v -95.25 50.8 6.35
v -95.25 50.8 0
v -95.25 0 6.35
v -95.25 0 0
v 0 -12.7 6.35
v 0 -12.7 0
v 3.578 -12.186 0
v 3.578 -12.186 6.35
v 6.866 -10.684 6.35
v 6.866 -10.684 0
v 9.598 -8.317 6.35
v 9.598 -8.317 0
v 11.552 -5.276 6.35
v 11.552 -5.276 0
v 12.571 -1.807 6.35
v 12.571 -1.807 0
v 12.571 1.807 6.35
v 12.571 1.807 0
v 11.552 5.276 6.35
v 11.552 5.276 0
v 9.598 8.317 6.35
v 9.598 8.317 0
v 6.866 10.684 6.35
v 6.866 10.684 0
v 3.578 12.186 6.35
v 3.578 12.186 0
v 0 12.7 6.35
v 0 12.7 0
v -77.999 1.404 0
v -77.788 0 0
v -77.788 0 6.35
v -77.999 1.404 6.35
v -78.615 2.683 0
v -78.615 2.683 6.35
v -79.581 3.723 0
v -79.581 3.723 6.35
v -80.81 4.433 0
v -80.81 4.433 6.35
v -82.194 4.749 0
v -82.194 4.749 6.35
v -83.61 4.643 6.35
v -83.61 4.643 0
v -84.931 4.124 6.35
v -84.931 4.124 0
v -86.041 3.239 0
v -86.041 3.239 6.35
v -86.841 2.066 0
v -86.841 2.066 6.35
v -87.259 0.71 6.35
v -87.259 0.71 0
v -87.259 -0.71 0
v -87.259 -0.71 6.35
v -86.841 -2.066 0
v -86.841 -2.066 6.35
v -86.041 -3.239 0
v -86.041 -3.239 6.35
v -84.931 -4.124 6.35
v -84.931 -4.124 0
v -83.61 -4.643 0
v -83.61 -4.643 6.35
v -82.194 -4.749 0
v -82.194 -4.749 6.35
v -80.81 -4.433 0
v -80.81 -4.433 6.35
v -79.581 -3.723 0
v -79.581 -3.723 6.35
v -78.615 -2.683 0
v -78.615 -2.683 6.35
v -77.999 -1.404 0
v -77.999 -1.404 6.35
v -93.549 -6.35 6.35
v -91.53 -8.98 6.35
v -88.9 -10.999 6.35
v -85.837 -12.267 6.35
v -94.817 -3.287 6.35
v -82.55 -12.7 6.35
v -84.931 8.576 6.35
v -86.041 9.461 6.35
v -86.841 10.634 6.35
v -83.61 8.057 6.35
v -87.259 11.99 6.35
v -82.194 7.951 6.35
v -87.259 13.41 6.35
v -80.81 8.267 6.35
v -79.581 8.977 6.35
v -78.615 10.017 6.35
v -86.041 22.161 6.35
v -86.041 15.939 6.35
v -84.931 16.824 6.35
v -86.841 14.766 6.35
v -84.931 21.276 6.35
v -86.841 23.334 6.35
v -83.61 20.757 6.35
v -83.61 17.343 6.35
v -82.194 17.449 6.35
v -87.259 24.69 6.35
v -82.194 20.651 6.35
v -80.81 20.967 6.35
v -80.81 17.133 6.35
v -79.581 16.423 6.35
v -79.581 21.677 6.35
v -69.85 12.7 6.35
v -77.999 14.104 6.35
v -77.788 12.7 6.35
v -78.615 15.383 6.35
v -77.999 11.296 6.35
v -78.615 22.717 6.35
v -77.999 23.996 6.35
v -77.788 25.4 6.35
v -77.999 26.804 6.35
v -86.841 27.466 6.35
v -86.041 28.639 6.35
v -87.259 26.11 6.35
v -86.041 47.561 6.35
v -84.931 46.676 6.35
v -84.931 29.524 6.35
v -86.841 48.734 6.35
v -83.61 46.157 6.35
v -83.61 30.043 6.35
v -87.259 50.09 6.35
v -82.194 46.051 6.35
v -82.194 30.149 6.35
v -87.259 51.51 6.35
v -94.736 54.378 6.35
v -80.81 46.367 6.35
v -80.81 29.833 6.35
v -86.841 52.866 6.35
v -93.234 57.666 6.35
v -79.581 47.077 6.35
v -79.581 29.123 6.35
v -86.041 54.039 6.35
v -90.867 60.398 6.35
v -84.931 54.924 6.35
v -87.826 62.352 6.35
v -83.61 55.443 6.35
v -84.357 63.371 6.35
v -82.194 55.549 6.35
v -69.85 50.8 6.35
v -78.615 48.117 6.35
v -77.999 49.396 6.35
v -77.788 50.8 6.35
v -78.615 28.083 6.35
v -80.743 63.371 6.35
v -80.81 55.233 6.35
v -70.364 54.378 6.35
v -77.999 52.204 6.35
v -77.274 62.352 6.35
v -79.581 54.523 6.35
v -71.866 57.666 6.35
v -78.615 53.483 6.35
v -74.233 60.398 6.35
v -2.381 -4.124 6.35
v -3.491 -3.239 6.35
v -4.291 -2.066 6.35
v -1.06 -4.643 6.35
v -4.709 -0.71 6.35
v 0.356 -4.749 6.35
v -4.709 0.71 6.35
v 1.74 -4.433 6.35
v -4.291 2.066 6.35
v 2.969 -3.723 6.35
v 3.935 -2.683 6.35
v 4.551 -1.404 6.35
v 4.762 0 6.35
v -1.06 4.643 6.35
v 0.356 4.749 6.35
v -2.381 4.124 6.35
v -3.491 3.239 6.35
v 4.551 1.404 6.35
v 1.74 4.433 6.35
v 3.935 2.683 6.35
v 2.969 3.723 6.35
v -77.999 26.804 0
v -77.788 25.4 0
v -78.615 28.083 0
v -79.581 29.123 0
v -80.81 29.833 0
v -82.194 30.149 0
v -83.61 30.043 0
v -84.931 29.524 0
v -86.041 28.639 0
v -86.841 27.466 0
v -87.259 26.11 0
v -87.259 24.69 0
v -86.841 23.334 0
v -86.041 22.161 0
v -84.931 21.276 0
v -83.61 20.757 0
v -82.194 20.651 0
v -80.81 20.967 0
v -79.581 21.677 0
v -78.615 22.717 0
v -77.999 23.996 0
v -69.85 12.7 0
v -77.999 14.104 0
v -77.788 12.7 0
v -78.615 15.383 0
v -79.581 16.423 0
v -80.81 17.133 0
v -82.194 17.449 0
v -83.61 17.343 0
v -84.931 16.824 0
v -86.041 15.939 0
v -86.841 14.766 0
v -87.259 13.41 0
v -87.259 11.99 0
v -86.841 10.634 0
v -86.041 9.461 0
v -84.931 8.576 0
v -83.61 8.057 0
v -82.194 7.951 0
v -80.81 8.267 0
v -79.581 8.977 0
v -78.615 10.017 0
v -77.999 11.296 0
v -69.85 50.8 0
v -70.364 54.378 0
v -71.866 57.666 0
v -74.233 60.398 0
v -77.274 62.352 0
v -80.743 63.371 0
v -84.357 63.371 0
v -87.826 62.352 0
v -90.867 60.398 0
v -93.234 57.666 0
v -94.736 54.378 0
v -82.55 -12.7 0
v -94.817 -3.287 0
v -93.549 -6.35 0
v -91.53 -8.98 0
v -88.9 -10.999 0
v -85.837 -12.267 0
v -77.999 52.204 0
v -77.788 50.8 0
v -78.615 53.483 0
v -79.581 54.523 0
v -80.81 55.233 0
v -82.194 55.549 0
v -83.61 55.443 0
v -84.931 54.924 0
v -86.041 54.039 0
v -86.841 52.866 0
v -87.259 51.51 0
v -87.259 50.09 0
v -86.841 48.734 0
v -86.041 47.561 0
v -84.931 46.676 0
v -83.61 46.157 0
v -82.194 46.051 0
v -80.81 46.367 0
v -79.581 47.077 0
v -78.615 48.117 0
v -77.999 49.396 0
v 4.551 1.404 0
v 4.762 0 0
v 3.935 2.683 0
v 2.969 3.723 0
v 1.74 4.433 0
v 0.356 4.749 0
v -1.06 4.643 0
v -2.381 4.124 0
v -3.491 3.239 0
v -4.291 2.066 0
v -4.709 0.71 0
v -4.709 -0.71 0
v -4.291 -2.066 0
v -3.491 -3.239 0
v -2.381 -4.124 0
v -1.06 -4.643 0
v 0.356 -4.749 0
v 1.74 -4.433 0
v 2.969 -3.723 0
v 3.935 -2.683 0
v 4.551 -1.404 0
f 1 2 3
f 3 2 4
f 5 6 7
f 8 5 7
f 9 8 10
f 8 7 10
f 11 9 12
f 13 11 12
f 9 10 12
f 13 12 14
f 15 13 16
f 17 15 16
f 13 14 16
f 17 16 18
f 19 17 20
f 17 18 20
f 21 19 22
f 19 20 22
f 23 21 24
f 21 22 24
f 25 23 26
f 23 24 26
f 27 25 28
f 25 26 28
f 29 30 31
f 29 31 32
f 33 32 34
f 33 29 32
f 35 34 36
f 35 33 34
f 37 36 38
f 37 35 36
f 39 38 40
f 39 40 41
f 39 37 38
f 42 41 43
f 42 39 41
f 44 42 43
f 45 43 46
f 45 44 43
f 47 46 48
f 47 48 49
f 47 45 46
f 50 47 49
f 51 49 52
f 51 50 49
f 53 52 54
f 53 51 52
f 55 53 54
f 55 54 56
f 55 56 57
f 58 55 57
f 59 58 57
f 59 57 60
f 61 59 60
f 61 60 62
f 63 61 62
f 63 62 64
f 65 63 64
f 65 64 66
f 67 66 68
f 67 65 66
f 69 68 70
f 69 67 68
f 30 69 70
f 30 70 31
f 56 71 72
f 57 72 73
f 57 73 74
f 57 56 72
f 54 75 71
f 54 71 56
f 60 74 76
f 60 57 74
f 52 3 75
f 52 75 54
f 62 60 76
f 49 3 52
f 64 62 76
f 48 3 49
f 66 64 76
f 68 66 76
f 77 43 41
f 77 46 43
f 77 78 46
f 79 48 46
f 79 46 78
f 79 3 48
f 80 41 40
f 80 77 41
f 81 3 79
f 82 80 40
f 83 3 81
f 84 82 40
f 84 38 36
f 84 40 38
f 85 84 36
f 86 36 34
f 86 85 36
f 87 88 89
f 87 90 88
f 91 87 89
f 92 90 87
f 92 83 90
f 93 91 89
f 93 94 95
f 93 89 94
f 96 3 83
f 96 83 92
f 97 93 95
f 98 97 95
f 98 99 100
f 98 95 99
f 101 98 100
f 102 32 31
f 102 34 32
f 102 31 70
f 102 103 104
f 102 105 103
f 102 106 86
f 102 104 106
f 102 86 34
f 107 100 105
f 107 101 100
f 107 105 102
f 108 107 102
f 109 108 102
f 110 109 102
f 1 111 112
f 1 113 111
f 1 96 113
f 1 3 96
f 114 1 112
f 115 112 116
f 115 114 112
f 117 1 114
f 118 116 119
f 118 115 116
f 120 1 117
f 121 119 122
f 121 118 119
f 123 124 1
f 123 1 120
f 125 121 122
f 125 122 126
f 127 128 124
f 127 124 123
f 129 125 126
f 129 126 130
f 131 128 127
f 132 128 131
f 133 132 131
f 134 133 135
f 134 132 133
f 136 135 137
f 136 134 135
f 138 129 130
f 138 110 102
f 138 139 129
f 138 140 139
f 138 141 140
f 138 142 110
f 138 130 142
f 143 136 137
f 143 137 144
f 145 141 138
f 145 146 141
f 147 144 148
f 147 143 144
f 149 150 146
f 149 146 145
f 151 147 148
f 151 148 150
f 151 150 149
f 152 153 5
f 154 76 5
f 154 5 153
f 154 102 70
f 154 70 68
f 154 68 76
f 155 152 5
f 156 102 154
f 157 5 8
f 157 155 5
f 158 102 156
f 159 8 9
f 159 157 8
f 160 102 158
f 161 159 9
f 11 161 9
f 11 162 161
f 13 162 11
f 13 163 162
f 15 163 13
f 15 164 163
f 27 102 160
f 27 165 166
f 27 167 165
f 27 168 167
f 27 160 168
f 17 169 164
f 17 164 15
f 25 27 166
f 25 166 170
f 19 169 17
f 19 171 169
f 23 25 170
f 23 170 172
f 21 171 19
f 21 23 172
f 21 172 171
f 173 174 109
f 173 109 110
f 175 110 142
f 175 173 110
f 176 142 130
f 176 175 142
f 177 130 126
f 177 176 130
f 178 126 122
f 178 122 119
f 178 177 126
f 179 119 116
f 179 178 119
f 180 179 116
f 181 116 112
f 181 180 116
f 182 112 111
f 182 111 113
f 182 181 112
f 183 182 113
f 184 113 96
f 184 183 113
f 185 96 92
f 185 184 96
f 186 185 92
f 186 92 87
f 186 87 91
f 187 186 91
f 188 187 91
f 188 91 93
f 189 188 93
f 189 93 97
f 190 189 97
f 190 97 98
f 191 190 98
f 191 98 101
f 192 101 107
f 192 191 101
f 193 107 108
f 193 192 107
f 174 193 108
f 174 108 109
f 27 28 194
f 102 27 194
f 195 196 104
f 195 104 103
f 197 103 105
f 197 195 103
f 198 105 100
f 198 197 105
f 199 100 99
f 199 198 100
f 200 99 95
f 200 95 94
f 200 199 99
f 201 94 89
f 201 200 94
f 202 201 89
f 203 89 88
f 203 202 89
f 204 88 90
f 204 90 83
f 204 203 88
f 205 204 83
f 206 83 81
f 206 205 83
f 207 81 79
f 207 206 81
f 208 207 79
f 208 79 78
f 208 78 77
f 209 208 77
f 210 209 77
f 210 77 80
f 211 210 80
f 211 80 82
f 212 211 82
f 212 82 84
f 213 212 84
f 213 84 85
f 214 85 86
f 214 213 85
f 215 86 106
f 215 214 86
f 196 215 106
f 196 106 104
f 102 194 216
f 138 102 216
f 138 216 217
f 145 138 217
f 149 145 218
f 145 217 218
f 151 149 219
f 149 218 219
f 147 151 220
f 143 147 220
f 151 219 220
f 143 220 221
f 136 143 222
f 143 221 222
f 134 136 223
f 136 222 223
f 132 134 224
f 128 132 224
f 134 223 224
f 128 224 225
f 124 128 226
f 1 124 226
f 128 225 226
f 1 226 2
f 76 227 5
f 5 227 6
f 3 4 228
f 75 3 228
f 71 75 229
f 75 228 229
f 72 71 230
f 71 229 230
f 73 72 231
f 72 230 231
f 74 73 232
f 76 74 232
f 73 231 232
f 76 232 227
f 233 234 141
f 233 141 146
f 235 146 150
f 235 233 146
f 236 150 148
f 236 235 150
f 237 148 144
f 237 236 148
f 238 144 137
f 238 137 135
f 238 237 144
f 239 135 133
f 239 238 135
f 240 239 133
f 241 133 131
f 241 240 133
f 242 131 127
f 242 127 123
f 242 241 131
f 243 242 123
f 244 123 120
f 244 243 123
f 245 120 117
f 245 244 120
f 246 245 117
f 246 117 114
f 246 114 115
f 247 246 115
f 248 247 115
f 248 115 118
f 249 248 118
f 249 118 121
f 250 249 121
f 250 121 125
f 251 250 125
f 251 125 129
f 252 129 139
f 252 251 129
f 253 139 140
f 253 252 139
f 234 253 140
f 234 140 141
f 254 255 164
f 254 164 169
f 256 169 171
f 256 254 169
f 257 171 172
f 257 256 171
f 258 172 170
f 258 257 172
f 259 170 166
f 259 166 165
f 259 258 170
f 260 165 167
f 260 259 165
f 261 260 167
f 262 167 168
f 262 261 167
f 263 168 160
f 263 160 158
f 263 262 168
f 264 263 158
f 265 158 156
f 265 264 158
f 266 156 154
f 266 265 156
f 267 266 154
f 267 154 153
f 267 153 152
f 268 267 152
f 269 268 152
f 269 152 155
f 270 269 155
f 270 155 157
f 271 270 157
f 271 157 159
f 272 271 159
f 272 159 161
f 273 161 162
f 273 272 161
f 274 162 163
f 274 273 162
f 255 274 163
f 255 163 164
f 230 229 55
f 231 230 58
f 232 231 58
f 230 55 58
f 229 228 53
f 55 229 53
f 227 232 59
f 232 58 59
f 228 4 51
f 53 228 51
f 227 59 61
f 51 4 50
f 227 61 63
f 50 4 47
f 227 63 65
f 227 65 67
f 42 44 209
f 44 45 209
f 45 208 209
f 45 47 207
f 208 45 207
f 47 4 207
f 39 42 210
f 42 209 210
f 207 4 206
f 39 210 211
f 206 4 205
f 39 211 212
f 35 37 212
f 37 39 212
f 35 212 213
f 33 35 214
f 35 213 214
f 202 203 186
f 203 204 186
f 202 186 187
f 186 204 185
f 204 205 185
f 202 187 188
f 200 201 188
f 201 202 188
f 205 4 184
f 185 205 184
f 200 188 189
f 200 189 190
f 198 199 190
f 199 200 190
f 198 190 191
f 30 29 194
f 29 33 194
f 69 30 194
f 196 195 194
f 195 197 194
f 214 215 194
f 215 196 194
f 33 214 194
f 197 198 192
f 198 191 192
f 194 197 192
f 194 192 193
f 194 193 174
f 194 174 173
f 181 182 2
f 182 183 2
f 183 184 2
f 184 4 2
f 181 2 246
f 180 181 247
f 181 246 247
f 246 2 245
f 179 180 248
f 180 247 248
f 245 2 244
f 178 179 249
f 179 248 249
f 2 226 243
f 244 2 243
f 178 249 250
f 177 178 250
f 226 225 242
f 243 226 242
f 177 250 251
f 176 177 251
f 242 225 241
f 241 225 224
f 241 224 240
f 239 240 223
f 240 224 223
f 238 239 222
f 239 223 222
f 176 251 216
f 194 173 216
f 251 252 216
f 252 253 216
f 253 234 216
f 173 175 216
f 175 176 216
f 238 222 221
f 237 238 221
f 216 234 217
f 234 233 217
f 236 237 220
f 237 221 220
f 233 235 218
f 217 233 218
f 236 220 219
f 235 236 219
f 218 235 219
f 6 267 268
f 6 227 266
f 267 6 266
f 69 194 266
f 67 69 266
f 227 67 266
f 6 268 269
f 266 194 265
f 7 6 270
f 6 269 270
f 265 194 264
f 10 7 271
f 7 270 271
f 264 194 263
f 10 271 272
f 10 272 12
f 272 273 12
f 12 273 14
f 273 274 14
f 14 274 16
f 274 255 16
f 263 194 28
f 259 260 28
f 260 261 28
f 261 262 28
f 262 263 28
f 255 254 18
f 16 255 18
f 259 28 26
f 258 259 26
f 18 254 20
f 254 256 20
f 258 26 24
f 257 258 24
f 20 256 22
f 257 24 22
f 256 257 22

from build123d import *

# Parameters (mm, degrees)
SKETCH1_R           = 4.7625
BOSS_EXTRUDE1_DEPTH = 6.35


with BuildPart() as part:
    # Sketch1 → Boss-Extrude1 (new body)
    with BuildSketch(Plane.XY):
        with BuildLine():
            Line((-82.55, -12.7), (0, -12.7))
            ThreePointArc((0, -12.7), (12.7, 0), (0, 12.7))
            Line((0, 12.7), (-69.85, 12.7))
            Line((-69.85, 12.7), (-69.85, 50.8))
            ThreePointArc((-69.85, 50.8), (-82.55, 63.5), (-95.25, 50.8))
            Line((-95.25, 50.8), (-95.25, 0))
            ThreePointArc((-95.25, 0), (-91.530256121, -8.980256121), (-82.55, -12.7))
        make_face()
        with Locations((-82.55, 12.7)):
            Circle(SKETCH1_R, mode=Mode.SUBTRACT)
        Circle(SKETCH1_R, mode=Mode.SUBTRACT)
        with Locations((-82.55, 0)):
            Circle(SKETCH1_R, mode=Mode.SUBTRACT)
        with Locations((-82.55, 50.8)):
            Circle(SKETCH1_R, mode=Mode.SUBTRACT)
        with Locations((-82.55, 25.4)):
            Circle(SKETCH1_R, mode=Mode.SUBTRACT)
    extrude(amount=BOSS_EXTRUDE1_DEPTH)


solid = part.part
